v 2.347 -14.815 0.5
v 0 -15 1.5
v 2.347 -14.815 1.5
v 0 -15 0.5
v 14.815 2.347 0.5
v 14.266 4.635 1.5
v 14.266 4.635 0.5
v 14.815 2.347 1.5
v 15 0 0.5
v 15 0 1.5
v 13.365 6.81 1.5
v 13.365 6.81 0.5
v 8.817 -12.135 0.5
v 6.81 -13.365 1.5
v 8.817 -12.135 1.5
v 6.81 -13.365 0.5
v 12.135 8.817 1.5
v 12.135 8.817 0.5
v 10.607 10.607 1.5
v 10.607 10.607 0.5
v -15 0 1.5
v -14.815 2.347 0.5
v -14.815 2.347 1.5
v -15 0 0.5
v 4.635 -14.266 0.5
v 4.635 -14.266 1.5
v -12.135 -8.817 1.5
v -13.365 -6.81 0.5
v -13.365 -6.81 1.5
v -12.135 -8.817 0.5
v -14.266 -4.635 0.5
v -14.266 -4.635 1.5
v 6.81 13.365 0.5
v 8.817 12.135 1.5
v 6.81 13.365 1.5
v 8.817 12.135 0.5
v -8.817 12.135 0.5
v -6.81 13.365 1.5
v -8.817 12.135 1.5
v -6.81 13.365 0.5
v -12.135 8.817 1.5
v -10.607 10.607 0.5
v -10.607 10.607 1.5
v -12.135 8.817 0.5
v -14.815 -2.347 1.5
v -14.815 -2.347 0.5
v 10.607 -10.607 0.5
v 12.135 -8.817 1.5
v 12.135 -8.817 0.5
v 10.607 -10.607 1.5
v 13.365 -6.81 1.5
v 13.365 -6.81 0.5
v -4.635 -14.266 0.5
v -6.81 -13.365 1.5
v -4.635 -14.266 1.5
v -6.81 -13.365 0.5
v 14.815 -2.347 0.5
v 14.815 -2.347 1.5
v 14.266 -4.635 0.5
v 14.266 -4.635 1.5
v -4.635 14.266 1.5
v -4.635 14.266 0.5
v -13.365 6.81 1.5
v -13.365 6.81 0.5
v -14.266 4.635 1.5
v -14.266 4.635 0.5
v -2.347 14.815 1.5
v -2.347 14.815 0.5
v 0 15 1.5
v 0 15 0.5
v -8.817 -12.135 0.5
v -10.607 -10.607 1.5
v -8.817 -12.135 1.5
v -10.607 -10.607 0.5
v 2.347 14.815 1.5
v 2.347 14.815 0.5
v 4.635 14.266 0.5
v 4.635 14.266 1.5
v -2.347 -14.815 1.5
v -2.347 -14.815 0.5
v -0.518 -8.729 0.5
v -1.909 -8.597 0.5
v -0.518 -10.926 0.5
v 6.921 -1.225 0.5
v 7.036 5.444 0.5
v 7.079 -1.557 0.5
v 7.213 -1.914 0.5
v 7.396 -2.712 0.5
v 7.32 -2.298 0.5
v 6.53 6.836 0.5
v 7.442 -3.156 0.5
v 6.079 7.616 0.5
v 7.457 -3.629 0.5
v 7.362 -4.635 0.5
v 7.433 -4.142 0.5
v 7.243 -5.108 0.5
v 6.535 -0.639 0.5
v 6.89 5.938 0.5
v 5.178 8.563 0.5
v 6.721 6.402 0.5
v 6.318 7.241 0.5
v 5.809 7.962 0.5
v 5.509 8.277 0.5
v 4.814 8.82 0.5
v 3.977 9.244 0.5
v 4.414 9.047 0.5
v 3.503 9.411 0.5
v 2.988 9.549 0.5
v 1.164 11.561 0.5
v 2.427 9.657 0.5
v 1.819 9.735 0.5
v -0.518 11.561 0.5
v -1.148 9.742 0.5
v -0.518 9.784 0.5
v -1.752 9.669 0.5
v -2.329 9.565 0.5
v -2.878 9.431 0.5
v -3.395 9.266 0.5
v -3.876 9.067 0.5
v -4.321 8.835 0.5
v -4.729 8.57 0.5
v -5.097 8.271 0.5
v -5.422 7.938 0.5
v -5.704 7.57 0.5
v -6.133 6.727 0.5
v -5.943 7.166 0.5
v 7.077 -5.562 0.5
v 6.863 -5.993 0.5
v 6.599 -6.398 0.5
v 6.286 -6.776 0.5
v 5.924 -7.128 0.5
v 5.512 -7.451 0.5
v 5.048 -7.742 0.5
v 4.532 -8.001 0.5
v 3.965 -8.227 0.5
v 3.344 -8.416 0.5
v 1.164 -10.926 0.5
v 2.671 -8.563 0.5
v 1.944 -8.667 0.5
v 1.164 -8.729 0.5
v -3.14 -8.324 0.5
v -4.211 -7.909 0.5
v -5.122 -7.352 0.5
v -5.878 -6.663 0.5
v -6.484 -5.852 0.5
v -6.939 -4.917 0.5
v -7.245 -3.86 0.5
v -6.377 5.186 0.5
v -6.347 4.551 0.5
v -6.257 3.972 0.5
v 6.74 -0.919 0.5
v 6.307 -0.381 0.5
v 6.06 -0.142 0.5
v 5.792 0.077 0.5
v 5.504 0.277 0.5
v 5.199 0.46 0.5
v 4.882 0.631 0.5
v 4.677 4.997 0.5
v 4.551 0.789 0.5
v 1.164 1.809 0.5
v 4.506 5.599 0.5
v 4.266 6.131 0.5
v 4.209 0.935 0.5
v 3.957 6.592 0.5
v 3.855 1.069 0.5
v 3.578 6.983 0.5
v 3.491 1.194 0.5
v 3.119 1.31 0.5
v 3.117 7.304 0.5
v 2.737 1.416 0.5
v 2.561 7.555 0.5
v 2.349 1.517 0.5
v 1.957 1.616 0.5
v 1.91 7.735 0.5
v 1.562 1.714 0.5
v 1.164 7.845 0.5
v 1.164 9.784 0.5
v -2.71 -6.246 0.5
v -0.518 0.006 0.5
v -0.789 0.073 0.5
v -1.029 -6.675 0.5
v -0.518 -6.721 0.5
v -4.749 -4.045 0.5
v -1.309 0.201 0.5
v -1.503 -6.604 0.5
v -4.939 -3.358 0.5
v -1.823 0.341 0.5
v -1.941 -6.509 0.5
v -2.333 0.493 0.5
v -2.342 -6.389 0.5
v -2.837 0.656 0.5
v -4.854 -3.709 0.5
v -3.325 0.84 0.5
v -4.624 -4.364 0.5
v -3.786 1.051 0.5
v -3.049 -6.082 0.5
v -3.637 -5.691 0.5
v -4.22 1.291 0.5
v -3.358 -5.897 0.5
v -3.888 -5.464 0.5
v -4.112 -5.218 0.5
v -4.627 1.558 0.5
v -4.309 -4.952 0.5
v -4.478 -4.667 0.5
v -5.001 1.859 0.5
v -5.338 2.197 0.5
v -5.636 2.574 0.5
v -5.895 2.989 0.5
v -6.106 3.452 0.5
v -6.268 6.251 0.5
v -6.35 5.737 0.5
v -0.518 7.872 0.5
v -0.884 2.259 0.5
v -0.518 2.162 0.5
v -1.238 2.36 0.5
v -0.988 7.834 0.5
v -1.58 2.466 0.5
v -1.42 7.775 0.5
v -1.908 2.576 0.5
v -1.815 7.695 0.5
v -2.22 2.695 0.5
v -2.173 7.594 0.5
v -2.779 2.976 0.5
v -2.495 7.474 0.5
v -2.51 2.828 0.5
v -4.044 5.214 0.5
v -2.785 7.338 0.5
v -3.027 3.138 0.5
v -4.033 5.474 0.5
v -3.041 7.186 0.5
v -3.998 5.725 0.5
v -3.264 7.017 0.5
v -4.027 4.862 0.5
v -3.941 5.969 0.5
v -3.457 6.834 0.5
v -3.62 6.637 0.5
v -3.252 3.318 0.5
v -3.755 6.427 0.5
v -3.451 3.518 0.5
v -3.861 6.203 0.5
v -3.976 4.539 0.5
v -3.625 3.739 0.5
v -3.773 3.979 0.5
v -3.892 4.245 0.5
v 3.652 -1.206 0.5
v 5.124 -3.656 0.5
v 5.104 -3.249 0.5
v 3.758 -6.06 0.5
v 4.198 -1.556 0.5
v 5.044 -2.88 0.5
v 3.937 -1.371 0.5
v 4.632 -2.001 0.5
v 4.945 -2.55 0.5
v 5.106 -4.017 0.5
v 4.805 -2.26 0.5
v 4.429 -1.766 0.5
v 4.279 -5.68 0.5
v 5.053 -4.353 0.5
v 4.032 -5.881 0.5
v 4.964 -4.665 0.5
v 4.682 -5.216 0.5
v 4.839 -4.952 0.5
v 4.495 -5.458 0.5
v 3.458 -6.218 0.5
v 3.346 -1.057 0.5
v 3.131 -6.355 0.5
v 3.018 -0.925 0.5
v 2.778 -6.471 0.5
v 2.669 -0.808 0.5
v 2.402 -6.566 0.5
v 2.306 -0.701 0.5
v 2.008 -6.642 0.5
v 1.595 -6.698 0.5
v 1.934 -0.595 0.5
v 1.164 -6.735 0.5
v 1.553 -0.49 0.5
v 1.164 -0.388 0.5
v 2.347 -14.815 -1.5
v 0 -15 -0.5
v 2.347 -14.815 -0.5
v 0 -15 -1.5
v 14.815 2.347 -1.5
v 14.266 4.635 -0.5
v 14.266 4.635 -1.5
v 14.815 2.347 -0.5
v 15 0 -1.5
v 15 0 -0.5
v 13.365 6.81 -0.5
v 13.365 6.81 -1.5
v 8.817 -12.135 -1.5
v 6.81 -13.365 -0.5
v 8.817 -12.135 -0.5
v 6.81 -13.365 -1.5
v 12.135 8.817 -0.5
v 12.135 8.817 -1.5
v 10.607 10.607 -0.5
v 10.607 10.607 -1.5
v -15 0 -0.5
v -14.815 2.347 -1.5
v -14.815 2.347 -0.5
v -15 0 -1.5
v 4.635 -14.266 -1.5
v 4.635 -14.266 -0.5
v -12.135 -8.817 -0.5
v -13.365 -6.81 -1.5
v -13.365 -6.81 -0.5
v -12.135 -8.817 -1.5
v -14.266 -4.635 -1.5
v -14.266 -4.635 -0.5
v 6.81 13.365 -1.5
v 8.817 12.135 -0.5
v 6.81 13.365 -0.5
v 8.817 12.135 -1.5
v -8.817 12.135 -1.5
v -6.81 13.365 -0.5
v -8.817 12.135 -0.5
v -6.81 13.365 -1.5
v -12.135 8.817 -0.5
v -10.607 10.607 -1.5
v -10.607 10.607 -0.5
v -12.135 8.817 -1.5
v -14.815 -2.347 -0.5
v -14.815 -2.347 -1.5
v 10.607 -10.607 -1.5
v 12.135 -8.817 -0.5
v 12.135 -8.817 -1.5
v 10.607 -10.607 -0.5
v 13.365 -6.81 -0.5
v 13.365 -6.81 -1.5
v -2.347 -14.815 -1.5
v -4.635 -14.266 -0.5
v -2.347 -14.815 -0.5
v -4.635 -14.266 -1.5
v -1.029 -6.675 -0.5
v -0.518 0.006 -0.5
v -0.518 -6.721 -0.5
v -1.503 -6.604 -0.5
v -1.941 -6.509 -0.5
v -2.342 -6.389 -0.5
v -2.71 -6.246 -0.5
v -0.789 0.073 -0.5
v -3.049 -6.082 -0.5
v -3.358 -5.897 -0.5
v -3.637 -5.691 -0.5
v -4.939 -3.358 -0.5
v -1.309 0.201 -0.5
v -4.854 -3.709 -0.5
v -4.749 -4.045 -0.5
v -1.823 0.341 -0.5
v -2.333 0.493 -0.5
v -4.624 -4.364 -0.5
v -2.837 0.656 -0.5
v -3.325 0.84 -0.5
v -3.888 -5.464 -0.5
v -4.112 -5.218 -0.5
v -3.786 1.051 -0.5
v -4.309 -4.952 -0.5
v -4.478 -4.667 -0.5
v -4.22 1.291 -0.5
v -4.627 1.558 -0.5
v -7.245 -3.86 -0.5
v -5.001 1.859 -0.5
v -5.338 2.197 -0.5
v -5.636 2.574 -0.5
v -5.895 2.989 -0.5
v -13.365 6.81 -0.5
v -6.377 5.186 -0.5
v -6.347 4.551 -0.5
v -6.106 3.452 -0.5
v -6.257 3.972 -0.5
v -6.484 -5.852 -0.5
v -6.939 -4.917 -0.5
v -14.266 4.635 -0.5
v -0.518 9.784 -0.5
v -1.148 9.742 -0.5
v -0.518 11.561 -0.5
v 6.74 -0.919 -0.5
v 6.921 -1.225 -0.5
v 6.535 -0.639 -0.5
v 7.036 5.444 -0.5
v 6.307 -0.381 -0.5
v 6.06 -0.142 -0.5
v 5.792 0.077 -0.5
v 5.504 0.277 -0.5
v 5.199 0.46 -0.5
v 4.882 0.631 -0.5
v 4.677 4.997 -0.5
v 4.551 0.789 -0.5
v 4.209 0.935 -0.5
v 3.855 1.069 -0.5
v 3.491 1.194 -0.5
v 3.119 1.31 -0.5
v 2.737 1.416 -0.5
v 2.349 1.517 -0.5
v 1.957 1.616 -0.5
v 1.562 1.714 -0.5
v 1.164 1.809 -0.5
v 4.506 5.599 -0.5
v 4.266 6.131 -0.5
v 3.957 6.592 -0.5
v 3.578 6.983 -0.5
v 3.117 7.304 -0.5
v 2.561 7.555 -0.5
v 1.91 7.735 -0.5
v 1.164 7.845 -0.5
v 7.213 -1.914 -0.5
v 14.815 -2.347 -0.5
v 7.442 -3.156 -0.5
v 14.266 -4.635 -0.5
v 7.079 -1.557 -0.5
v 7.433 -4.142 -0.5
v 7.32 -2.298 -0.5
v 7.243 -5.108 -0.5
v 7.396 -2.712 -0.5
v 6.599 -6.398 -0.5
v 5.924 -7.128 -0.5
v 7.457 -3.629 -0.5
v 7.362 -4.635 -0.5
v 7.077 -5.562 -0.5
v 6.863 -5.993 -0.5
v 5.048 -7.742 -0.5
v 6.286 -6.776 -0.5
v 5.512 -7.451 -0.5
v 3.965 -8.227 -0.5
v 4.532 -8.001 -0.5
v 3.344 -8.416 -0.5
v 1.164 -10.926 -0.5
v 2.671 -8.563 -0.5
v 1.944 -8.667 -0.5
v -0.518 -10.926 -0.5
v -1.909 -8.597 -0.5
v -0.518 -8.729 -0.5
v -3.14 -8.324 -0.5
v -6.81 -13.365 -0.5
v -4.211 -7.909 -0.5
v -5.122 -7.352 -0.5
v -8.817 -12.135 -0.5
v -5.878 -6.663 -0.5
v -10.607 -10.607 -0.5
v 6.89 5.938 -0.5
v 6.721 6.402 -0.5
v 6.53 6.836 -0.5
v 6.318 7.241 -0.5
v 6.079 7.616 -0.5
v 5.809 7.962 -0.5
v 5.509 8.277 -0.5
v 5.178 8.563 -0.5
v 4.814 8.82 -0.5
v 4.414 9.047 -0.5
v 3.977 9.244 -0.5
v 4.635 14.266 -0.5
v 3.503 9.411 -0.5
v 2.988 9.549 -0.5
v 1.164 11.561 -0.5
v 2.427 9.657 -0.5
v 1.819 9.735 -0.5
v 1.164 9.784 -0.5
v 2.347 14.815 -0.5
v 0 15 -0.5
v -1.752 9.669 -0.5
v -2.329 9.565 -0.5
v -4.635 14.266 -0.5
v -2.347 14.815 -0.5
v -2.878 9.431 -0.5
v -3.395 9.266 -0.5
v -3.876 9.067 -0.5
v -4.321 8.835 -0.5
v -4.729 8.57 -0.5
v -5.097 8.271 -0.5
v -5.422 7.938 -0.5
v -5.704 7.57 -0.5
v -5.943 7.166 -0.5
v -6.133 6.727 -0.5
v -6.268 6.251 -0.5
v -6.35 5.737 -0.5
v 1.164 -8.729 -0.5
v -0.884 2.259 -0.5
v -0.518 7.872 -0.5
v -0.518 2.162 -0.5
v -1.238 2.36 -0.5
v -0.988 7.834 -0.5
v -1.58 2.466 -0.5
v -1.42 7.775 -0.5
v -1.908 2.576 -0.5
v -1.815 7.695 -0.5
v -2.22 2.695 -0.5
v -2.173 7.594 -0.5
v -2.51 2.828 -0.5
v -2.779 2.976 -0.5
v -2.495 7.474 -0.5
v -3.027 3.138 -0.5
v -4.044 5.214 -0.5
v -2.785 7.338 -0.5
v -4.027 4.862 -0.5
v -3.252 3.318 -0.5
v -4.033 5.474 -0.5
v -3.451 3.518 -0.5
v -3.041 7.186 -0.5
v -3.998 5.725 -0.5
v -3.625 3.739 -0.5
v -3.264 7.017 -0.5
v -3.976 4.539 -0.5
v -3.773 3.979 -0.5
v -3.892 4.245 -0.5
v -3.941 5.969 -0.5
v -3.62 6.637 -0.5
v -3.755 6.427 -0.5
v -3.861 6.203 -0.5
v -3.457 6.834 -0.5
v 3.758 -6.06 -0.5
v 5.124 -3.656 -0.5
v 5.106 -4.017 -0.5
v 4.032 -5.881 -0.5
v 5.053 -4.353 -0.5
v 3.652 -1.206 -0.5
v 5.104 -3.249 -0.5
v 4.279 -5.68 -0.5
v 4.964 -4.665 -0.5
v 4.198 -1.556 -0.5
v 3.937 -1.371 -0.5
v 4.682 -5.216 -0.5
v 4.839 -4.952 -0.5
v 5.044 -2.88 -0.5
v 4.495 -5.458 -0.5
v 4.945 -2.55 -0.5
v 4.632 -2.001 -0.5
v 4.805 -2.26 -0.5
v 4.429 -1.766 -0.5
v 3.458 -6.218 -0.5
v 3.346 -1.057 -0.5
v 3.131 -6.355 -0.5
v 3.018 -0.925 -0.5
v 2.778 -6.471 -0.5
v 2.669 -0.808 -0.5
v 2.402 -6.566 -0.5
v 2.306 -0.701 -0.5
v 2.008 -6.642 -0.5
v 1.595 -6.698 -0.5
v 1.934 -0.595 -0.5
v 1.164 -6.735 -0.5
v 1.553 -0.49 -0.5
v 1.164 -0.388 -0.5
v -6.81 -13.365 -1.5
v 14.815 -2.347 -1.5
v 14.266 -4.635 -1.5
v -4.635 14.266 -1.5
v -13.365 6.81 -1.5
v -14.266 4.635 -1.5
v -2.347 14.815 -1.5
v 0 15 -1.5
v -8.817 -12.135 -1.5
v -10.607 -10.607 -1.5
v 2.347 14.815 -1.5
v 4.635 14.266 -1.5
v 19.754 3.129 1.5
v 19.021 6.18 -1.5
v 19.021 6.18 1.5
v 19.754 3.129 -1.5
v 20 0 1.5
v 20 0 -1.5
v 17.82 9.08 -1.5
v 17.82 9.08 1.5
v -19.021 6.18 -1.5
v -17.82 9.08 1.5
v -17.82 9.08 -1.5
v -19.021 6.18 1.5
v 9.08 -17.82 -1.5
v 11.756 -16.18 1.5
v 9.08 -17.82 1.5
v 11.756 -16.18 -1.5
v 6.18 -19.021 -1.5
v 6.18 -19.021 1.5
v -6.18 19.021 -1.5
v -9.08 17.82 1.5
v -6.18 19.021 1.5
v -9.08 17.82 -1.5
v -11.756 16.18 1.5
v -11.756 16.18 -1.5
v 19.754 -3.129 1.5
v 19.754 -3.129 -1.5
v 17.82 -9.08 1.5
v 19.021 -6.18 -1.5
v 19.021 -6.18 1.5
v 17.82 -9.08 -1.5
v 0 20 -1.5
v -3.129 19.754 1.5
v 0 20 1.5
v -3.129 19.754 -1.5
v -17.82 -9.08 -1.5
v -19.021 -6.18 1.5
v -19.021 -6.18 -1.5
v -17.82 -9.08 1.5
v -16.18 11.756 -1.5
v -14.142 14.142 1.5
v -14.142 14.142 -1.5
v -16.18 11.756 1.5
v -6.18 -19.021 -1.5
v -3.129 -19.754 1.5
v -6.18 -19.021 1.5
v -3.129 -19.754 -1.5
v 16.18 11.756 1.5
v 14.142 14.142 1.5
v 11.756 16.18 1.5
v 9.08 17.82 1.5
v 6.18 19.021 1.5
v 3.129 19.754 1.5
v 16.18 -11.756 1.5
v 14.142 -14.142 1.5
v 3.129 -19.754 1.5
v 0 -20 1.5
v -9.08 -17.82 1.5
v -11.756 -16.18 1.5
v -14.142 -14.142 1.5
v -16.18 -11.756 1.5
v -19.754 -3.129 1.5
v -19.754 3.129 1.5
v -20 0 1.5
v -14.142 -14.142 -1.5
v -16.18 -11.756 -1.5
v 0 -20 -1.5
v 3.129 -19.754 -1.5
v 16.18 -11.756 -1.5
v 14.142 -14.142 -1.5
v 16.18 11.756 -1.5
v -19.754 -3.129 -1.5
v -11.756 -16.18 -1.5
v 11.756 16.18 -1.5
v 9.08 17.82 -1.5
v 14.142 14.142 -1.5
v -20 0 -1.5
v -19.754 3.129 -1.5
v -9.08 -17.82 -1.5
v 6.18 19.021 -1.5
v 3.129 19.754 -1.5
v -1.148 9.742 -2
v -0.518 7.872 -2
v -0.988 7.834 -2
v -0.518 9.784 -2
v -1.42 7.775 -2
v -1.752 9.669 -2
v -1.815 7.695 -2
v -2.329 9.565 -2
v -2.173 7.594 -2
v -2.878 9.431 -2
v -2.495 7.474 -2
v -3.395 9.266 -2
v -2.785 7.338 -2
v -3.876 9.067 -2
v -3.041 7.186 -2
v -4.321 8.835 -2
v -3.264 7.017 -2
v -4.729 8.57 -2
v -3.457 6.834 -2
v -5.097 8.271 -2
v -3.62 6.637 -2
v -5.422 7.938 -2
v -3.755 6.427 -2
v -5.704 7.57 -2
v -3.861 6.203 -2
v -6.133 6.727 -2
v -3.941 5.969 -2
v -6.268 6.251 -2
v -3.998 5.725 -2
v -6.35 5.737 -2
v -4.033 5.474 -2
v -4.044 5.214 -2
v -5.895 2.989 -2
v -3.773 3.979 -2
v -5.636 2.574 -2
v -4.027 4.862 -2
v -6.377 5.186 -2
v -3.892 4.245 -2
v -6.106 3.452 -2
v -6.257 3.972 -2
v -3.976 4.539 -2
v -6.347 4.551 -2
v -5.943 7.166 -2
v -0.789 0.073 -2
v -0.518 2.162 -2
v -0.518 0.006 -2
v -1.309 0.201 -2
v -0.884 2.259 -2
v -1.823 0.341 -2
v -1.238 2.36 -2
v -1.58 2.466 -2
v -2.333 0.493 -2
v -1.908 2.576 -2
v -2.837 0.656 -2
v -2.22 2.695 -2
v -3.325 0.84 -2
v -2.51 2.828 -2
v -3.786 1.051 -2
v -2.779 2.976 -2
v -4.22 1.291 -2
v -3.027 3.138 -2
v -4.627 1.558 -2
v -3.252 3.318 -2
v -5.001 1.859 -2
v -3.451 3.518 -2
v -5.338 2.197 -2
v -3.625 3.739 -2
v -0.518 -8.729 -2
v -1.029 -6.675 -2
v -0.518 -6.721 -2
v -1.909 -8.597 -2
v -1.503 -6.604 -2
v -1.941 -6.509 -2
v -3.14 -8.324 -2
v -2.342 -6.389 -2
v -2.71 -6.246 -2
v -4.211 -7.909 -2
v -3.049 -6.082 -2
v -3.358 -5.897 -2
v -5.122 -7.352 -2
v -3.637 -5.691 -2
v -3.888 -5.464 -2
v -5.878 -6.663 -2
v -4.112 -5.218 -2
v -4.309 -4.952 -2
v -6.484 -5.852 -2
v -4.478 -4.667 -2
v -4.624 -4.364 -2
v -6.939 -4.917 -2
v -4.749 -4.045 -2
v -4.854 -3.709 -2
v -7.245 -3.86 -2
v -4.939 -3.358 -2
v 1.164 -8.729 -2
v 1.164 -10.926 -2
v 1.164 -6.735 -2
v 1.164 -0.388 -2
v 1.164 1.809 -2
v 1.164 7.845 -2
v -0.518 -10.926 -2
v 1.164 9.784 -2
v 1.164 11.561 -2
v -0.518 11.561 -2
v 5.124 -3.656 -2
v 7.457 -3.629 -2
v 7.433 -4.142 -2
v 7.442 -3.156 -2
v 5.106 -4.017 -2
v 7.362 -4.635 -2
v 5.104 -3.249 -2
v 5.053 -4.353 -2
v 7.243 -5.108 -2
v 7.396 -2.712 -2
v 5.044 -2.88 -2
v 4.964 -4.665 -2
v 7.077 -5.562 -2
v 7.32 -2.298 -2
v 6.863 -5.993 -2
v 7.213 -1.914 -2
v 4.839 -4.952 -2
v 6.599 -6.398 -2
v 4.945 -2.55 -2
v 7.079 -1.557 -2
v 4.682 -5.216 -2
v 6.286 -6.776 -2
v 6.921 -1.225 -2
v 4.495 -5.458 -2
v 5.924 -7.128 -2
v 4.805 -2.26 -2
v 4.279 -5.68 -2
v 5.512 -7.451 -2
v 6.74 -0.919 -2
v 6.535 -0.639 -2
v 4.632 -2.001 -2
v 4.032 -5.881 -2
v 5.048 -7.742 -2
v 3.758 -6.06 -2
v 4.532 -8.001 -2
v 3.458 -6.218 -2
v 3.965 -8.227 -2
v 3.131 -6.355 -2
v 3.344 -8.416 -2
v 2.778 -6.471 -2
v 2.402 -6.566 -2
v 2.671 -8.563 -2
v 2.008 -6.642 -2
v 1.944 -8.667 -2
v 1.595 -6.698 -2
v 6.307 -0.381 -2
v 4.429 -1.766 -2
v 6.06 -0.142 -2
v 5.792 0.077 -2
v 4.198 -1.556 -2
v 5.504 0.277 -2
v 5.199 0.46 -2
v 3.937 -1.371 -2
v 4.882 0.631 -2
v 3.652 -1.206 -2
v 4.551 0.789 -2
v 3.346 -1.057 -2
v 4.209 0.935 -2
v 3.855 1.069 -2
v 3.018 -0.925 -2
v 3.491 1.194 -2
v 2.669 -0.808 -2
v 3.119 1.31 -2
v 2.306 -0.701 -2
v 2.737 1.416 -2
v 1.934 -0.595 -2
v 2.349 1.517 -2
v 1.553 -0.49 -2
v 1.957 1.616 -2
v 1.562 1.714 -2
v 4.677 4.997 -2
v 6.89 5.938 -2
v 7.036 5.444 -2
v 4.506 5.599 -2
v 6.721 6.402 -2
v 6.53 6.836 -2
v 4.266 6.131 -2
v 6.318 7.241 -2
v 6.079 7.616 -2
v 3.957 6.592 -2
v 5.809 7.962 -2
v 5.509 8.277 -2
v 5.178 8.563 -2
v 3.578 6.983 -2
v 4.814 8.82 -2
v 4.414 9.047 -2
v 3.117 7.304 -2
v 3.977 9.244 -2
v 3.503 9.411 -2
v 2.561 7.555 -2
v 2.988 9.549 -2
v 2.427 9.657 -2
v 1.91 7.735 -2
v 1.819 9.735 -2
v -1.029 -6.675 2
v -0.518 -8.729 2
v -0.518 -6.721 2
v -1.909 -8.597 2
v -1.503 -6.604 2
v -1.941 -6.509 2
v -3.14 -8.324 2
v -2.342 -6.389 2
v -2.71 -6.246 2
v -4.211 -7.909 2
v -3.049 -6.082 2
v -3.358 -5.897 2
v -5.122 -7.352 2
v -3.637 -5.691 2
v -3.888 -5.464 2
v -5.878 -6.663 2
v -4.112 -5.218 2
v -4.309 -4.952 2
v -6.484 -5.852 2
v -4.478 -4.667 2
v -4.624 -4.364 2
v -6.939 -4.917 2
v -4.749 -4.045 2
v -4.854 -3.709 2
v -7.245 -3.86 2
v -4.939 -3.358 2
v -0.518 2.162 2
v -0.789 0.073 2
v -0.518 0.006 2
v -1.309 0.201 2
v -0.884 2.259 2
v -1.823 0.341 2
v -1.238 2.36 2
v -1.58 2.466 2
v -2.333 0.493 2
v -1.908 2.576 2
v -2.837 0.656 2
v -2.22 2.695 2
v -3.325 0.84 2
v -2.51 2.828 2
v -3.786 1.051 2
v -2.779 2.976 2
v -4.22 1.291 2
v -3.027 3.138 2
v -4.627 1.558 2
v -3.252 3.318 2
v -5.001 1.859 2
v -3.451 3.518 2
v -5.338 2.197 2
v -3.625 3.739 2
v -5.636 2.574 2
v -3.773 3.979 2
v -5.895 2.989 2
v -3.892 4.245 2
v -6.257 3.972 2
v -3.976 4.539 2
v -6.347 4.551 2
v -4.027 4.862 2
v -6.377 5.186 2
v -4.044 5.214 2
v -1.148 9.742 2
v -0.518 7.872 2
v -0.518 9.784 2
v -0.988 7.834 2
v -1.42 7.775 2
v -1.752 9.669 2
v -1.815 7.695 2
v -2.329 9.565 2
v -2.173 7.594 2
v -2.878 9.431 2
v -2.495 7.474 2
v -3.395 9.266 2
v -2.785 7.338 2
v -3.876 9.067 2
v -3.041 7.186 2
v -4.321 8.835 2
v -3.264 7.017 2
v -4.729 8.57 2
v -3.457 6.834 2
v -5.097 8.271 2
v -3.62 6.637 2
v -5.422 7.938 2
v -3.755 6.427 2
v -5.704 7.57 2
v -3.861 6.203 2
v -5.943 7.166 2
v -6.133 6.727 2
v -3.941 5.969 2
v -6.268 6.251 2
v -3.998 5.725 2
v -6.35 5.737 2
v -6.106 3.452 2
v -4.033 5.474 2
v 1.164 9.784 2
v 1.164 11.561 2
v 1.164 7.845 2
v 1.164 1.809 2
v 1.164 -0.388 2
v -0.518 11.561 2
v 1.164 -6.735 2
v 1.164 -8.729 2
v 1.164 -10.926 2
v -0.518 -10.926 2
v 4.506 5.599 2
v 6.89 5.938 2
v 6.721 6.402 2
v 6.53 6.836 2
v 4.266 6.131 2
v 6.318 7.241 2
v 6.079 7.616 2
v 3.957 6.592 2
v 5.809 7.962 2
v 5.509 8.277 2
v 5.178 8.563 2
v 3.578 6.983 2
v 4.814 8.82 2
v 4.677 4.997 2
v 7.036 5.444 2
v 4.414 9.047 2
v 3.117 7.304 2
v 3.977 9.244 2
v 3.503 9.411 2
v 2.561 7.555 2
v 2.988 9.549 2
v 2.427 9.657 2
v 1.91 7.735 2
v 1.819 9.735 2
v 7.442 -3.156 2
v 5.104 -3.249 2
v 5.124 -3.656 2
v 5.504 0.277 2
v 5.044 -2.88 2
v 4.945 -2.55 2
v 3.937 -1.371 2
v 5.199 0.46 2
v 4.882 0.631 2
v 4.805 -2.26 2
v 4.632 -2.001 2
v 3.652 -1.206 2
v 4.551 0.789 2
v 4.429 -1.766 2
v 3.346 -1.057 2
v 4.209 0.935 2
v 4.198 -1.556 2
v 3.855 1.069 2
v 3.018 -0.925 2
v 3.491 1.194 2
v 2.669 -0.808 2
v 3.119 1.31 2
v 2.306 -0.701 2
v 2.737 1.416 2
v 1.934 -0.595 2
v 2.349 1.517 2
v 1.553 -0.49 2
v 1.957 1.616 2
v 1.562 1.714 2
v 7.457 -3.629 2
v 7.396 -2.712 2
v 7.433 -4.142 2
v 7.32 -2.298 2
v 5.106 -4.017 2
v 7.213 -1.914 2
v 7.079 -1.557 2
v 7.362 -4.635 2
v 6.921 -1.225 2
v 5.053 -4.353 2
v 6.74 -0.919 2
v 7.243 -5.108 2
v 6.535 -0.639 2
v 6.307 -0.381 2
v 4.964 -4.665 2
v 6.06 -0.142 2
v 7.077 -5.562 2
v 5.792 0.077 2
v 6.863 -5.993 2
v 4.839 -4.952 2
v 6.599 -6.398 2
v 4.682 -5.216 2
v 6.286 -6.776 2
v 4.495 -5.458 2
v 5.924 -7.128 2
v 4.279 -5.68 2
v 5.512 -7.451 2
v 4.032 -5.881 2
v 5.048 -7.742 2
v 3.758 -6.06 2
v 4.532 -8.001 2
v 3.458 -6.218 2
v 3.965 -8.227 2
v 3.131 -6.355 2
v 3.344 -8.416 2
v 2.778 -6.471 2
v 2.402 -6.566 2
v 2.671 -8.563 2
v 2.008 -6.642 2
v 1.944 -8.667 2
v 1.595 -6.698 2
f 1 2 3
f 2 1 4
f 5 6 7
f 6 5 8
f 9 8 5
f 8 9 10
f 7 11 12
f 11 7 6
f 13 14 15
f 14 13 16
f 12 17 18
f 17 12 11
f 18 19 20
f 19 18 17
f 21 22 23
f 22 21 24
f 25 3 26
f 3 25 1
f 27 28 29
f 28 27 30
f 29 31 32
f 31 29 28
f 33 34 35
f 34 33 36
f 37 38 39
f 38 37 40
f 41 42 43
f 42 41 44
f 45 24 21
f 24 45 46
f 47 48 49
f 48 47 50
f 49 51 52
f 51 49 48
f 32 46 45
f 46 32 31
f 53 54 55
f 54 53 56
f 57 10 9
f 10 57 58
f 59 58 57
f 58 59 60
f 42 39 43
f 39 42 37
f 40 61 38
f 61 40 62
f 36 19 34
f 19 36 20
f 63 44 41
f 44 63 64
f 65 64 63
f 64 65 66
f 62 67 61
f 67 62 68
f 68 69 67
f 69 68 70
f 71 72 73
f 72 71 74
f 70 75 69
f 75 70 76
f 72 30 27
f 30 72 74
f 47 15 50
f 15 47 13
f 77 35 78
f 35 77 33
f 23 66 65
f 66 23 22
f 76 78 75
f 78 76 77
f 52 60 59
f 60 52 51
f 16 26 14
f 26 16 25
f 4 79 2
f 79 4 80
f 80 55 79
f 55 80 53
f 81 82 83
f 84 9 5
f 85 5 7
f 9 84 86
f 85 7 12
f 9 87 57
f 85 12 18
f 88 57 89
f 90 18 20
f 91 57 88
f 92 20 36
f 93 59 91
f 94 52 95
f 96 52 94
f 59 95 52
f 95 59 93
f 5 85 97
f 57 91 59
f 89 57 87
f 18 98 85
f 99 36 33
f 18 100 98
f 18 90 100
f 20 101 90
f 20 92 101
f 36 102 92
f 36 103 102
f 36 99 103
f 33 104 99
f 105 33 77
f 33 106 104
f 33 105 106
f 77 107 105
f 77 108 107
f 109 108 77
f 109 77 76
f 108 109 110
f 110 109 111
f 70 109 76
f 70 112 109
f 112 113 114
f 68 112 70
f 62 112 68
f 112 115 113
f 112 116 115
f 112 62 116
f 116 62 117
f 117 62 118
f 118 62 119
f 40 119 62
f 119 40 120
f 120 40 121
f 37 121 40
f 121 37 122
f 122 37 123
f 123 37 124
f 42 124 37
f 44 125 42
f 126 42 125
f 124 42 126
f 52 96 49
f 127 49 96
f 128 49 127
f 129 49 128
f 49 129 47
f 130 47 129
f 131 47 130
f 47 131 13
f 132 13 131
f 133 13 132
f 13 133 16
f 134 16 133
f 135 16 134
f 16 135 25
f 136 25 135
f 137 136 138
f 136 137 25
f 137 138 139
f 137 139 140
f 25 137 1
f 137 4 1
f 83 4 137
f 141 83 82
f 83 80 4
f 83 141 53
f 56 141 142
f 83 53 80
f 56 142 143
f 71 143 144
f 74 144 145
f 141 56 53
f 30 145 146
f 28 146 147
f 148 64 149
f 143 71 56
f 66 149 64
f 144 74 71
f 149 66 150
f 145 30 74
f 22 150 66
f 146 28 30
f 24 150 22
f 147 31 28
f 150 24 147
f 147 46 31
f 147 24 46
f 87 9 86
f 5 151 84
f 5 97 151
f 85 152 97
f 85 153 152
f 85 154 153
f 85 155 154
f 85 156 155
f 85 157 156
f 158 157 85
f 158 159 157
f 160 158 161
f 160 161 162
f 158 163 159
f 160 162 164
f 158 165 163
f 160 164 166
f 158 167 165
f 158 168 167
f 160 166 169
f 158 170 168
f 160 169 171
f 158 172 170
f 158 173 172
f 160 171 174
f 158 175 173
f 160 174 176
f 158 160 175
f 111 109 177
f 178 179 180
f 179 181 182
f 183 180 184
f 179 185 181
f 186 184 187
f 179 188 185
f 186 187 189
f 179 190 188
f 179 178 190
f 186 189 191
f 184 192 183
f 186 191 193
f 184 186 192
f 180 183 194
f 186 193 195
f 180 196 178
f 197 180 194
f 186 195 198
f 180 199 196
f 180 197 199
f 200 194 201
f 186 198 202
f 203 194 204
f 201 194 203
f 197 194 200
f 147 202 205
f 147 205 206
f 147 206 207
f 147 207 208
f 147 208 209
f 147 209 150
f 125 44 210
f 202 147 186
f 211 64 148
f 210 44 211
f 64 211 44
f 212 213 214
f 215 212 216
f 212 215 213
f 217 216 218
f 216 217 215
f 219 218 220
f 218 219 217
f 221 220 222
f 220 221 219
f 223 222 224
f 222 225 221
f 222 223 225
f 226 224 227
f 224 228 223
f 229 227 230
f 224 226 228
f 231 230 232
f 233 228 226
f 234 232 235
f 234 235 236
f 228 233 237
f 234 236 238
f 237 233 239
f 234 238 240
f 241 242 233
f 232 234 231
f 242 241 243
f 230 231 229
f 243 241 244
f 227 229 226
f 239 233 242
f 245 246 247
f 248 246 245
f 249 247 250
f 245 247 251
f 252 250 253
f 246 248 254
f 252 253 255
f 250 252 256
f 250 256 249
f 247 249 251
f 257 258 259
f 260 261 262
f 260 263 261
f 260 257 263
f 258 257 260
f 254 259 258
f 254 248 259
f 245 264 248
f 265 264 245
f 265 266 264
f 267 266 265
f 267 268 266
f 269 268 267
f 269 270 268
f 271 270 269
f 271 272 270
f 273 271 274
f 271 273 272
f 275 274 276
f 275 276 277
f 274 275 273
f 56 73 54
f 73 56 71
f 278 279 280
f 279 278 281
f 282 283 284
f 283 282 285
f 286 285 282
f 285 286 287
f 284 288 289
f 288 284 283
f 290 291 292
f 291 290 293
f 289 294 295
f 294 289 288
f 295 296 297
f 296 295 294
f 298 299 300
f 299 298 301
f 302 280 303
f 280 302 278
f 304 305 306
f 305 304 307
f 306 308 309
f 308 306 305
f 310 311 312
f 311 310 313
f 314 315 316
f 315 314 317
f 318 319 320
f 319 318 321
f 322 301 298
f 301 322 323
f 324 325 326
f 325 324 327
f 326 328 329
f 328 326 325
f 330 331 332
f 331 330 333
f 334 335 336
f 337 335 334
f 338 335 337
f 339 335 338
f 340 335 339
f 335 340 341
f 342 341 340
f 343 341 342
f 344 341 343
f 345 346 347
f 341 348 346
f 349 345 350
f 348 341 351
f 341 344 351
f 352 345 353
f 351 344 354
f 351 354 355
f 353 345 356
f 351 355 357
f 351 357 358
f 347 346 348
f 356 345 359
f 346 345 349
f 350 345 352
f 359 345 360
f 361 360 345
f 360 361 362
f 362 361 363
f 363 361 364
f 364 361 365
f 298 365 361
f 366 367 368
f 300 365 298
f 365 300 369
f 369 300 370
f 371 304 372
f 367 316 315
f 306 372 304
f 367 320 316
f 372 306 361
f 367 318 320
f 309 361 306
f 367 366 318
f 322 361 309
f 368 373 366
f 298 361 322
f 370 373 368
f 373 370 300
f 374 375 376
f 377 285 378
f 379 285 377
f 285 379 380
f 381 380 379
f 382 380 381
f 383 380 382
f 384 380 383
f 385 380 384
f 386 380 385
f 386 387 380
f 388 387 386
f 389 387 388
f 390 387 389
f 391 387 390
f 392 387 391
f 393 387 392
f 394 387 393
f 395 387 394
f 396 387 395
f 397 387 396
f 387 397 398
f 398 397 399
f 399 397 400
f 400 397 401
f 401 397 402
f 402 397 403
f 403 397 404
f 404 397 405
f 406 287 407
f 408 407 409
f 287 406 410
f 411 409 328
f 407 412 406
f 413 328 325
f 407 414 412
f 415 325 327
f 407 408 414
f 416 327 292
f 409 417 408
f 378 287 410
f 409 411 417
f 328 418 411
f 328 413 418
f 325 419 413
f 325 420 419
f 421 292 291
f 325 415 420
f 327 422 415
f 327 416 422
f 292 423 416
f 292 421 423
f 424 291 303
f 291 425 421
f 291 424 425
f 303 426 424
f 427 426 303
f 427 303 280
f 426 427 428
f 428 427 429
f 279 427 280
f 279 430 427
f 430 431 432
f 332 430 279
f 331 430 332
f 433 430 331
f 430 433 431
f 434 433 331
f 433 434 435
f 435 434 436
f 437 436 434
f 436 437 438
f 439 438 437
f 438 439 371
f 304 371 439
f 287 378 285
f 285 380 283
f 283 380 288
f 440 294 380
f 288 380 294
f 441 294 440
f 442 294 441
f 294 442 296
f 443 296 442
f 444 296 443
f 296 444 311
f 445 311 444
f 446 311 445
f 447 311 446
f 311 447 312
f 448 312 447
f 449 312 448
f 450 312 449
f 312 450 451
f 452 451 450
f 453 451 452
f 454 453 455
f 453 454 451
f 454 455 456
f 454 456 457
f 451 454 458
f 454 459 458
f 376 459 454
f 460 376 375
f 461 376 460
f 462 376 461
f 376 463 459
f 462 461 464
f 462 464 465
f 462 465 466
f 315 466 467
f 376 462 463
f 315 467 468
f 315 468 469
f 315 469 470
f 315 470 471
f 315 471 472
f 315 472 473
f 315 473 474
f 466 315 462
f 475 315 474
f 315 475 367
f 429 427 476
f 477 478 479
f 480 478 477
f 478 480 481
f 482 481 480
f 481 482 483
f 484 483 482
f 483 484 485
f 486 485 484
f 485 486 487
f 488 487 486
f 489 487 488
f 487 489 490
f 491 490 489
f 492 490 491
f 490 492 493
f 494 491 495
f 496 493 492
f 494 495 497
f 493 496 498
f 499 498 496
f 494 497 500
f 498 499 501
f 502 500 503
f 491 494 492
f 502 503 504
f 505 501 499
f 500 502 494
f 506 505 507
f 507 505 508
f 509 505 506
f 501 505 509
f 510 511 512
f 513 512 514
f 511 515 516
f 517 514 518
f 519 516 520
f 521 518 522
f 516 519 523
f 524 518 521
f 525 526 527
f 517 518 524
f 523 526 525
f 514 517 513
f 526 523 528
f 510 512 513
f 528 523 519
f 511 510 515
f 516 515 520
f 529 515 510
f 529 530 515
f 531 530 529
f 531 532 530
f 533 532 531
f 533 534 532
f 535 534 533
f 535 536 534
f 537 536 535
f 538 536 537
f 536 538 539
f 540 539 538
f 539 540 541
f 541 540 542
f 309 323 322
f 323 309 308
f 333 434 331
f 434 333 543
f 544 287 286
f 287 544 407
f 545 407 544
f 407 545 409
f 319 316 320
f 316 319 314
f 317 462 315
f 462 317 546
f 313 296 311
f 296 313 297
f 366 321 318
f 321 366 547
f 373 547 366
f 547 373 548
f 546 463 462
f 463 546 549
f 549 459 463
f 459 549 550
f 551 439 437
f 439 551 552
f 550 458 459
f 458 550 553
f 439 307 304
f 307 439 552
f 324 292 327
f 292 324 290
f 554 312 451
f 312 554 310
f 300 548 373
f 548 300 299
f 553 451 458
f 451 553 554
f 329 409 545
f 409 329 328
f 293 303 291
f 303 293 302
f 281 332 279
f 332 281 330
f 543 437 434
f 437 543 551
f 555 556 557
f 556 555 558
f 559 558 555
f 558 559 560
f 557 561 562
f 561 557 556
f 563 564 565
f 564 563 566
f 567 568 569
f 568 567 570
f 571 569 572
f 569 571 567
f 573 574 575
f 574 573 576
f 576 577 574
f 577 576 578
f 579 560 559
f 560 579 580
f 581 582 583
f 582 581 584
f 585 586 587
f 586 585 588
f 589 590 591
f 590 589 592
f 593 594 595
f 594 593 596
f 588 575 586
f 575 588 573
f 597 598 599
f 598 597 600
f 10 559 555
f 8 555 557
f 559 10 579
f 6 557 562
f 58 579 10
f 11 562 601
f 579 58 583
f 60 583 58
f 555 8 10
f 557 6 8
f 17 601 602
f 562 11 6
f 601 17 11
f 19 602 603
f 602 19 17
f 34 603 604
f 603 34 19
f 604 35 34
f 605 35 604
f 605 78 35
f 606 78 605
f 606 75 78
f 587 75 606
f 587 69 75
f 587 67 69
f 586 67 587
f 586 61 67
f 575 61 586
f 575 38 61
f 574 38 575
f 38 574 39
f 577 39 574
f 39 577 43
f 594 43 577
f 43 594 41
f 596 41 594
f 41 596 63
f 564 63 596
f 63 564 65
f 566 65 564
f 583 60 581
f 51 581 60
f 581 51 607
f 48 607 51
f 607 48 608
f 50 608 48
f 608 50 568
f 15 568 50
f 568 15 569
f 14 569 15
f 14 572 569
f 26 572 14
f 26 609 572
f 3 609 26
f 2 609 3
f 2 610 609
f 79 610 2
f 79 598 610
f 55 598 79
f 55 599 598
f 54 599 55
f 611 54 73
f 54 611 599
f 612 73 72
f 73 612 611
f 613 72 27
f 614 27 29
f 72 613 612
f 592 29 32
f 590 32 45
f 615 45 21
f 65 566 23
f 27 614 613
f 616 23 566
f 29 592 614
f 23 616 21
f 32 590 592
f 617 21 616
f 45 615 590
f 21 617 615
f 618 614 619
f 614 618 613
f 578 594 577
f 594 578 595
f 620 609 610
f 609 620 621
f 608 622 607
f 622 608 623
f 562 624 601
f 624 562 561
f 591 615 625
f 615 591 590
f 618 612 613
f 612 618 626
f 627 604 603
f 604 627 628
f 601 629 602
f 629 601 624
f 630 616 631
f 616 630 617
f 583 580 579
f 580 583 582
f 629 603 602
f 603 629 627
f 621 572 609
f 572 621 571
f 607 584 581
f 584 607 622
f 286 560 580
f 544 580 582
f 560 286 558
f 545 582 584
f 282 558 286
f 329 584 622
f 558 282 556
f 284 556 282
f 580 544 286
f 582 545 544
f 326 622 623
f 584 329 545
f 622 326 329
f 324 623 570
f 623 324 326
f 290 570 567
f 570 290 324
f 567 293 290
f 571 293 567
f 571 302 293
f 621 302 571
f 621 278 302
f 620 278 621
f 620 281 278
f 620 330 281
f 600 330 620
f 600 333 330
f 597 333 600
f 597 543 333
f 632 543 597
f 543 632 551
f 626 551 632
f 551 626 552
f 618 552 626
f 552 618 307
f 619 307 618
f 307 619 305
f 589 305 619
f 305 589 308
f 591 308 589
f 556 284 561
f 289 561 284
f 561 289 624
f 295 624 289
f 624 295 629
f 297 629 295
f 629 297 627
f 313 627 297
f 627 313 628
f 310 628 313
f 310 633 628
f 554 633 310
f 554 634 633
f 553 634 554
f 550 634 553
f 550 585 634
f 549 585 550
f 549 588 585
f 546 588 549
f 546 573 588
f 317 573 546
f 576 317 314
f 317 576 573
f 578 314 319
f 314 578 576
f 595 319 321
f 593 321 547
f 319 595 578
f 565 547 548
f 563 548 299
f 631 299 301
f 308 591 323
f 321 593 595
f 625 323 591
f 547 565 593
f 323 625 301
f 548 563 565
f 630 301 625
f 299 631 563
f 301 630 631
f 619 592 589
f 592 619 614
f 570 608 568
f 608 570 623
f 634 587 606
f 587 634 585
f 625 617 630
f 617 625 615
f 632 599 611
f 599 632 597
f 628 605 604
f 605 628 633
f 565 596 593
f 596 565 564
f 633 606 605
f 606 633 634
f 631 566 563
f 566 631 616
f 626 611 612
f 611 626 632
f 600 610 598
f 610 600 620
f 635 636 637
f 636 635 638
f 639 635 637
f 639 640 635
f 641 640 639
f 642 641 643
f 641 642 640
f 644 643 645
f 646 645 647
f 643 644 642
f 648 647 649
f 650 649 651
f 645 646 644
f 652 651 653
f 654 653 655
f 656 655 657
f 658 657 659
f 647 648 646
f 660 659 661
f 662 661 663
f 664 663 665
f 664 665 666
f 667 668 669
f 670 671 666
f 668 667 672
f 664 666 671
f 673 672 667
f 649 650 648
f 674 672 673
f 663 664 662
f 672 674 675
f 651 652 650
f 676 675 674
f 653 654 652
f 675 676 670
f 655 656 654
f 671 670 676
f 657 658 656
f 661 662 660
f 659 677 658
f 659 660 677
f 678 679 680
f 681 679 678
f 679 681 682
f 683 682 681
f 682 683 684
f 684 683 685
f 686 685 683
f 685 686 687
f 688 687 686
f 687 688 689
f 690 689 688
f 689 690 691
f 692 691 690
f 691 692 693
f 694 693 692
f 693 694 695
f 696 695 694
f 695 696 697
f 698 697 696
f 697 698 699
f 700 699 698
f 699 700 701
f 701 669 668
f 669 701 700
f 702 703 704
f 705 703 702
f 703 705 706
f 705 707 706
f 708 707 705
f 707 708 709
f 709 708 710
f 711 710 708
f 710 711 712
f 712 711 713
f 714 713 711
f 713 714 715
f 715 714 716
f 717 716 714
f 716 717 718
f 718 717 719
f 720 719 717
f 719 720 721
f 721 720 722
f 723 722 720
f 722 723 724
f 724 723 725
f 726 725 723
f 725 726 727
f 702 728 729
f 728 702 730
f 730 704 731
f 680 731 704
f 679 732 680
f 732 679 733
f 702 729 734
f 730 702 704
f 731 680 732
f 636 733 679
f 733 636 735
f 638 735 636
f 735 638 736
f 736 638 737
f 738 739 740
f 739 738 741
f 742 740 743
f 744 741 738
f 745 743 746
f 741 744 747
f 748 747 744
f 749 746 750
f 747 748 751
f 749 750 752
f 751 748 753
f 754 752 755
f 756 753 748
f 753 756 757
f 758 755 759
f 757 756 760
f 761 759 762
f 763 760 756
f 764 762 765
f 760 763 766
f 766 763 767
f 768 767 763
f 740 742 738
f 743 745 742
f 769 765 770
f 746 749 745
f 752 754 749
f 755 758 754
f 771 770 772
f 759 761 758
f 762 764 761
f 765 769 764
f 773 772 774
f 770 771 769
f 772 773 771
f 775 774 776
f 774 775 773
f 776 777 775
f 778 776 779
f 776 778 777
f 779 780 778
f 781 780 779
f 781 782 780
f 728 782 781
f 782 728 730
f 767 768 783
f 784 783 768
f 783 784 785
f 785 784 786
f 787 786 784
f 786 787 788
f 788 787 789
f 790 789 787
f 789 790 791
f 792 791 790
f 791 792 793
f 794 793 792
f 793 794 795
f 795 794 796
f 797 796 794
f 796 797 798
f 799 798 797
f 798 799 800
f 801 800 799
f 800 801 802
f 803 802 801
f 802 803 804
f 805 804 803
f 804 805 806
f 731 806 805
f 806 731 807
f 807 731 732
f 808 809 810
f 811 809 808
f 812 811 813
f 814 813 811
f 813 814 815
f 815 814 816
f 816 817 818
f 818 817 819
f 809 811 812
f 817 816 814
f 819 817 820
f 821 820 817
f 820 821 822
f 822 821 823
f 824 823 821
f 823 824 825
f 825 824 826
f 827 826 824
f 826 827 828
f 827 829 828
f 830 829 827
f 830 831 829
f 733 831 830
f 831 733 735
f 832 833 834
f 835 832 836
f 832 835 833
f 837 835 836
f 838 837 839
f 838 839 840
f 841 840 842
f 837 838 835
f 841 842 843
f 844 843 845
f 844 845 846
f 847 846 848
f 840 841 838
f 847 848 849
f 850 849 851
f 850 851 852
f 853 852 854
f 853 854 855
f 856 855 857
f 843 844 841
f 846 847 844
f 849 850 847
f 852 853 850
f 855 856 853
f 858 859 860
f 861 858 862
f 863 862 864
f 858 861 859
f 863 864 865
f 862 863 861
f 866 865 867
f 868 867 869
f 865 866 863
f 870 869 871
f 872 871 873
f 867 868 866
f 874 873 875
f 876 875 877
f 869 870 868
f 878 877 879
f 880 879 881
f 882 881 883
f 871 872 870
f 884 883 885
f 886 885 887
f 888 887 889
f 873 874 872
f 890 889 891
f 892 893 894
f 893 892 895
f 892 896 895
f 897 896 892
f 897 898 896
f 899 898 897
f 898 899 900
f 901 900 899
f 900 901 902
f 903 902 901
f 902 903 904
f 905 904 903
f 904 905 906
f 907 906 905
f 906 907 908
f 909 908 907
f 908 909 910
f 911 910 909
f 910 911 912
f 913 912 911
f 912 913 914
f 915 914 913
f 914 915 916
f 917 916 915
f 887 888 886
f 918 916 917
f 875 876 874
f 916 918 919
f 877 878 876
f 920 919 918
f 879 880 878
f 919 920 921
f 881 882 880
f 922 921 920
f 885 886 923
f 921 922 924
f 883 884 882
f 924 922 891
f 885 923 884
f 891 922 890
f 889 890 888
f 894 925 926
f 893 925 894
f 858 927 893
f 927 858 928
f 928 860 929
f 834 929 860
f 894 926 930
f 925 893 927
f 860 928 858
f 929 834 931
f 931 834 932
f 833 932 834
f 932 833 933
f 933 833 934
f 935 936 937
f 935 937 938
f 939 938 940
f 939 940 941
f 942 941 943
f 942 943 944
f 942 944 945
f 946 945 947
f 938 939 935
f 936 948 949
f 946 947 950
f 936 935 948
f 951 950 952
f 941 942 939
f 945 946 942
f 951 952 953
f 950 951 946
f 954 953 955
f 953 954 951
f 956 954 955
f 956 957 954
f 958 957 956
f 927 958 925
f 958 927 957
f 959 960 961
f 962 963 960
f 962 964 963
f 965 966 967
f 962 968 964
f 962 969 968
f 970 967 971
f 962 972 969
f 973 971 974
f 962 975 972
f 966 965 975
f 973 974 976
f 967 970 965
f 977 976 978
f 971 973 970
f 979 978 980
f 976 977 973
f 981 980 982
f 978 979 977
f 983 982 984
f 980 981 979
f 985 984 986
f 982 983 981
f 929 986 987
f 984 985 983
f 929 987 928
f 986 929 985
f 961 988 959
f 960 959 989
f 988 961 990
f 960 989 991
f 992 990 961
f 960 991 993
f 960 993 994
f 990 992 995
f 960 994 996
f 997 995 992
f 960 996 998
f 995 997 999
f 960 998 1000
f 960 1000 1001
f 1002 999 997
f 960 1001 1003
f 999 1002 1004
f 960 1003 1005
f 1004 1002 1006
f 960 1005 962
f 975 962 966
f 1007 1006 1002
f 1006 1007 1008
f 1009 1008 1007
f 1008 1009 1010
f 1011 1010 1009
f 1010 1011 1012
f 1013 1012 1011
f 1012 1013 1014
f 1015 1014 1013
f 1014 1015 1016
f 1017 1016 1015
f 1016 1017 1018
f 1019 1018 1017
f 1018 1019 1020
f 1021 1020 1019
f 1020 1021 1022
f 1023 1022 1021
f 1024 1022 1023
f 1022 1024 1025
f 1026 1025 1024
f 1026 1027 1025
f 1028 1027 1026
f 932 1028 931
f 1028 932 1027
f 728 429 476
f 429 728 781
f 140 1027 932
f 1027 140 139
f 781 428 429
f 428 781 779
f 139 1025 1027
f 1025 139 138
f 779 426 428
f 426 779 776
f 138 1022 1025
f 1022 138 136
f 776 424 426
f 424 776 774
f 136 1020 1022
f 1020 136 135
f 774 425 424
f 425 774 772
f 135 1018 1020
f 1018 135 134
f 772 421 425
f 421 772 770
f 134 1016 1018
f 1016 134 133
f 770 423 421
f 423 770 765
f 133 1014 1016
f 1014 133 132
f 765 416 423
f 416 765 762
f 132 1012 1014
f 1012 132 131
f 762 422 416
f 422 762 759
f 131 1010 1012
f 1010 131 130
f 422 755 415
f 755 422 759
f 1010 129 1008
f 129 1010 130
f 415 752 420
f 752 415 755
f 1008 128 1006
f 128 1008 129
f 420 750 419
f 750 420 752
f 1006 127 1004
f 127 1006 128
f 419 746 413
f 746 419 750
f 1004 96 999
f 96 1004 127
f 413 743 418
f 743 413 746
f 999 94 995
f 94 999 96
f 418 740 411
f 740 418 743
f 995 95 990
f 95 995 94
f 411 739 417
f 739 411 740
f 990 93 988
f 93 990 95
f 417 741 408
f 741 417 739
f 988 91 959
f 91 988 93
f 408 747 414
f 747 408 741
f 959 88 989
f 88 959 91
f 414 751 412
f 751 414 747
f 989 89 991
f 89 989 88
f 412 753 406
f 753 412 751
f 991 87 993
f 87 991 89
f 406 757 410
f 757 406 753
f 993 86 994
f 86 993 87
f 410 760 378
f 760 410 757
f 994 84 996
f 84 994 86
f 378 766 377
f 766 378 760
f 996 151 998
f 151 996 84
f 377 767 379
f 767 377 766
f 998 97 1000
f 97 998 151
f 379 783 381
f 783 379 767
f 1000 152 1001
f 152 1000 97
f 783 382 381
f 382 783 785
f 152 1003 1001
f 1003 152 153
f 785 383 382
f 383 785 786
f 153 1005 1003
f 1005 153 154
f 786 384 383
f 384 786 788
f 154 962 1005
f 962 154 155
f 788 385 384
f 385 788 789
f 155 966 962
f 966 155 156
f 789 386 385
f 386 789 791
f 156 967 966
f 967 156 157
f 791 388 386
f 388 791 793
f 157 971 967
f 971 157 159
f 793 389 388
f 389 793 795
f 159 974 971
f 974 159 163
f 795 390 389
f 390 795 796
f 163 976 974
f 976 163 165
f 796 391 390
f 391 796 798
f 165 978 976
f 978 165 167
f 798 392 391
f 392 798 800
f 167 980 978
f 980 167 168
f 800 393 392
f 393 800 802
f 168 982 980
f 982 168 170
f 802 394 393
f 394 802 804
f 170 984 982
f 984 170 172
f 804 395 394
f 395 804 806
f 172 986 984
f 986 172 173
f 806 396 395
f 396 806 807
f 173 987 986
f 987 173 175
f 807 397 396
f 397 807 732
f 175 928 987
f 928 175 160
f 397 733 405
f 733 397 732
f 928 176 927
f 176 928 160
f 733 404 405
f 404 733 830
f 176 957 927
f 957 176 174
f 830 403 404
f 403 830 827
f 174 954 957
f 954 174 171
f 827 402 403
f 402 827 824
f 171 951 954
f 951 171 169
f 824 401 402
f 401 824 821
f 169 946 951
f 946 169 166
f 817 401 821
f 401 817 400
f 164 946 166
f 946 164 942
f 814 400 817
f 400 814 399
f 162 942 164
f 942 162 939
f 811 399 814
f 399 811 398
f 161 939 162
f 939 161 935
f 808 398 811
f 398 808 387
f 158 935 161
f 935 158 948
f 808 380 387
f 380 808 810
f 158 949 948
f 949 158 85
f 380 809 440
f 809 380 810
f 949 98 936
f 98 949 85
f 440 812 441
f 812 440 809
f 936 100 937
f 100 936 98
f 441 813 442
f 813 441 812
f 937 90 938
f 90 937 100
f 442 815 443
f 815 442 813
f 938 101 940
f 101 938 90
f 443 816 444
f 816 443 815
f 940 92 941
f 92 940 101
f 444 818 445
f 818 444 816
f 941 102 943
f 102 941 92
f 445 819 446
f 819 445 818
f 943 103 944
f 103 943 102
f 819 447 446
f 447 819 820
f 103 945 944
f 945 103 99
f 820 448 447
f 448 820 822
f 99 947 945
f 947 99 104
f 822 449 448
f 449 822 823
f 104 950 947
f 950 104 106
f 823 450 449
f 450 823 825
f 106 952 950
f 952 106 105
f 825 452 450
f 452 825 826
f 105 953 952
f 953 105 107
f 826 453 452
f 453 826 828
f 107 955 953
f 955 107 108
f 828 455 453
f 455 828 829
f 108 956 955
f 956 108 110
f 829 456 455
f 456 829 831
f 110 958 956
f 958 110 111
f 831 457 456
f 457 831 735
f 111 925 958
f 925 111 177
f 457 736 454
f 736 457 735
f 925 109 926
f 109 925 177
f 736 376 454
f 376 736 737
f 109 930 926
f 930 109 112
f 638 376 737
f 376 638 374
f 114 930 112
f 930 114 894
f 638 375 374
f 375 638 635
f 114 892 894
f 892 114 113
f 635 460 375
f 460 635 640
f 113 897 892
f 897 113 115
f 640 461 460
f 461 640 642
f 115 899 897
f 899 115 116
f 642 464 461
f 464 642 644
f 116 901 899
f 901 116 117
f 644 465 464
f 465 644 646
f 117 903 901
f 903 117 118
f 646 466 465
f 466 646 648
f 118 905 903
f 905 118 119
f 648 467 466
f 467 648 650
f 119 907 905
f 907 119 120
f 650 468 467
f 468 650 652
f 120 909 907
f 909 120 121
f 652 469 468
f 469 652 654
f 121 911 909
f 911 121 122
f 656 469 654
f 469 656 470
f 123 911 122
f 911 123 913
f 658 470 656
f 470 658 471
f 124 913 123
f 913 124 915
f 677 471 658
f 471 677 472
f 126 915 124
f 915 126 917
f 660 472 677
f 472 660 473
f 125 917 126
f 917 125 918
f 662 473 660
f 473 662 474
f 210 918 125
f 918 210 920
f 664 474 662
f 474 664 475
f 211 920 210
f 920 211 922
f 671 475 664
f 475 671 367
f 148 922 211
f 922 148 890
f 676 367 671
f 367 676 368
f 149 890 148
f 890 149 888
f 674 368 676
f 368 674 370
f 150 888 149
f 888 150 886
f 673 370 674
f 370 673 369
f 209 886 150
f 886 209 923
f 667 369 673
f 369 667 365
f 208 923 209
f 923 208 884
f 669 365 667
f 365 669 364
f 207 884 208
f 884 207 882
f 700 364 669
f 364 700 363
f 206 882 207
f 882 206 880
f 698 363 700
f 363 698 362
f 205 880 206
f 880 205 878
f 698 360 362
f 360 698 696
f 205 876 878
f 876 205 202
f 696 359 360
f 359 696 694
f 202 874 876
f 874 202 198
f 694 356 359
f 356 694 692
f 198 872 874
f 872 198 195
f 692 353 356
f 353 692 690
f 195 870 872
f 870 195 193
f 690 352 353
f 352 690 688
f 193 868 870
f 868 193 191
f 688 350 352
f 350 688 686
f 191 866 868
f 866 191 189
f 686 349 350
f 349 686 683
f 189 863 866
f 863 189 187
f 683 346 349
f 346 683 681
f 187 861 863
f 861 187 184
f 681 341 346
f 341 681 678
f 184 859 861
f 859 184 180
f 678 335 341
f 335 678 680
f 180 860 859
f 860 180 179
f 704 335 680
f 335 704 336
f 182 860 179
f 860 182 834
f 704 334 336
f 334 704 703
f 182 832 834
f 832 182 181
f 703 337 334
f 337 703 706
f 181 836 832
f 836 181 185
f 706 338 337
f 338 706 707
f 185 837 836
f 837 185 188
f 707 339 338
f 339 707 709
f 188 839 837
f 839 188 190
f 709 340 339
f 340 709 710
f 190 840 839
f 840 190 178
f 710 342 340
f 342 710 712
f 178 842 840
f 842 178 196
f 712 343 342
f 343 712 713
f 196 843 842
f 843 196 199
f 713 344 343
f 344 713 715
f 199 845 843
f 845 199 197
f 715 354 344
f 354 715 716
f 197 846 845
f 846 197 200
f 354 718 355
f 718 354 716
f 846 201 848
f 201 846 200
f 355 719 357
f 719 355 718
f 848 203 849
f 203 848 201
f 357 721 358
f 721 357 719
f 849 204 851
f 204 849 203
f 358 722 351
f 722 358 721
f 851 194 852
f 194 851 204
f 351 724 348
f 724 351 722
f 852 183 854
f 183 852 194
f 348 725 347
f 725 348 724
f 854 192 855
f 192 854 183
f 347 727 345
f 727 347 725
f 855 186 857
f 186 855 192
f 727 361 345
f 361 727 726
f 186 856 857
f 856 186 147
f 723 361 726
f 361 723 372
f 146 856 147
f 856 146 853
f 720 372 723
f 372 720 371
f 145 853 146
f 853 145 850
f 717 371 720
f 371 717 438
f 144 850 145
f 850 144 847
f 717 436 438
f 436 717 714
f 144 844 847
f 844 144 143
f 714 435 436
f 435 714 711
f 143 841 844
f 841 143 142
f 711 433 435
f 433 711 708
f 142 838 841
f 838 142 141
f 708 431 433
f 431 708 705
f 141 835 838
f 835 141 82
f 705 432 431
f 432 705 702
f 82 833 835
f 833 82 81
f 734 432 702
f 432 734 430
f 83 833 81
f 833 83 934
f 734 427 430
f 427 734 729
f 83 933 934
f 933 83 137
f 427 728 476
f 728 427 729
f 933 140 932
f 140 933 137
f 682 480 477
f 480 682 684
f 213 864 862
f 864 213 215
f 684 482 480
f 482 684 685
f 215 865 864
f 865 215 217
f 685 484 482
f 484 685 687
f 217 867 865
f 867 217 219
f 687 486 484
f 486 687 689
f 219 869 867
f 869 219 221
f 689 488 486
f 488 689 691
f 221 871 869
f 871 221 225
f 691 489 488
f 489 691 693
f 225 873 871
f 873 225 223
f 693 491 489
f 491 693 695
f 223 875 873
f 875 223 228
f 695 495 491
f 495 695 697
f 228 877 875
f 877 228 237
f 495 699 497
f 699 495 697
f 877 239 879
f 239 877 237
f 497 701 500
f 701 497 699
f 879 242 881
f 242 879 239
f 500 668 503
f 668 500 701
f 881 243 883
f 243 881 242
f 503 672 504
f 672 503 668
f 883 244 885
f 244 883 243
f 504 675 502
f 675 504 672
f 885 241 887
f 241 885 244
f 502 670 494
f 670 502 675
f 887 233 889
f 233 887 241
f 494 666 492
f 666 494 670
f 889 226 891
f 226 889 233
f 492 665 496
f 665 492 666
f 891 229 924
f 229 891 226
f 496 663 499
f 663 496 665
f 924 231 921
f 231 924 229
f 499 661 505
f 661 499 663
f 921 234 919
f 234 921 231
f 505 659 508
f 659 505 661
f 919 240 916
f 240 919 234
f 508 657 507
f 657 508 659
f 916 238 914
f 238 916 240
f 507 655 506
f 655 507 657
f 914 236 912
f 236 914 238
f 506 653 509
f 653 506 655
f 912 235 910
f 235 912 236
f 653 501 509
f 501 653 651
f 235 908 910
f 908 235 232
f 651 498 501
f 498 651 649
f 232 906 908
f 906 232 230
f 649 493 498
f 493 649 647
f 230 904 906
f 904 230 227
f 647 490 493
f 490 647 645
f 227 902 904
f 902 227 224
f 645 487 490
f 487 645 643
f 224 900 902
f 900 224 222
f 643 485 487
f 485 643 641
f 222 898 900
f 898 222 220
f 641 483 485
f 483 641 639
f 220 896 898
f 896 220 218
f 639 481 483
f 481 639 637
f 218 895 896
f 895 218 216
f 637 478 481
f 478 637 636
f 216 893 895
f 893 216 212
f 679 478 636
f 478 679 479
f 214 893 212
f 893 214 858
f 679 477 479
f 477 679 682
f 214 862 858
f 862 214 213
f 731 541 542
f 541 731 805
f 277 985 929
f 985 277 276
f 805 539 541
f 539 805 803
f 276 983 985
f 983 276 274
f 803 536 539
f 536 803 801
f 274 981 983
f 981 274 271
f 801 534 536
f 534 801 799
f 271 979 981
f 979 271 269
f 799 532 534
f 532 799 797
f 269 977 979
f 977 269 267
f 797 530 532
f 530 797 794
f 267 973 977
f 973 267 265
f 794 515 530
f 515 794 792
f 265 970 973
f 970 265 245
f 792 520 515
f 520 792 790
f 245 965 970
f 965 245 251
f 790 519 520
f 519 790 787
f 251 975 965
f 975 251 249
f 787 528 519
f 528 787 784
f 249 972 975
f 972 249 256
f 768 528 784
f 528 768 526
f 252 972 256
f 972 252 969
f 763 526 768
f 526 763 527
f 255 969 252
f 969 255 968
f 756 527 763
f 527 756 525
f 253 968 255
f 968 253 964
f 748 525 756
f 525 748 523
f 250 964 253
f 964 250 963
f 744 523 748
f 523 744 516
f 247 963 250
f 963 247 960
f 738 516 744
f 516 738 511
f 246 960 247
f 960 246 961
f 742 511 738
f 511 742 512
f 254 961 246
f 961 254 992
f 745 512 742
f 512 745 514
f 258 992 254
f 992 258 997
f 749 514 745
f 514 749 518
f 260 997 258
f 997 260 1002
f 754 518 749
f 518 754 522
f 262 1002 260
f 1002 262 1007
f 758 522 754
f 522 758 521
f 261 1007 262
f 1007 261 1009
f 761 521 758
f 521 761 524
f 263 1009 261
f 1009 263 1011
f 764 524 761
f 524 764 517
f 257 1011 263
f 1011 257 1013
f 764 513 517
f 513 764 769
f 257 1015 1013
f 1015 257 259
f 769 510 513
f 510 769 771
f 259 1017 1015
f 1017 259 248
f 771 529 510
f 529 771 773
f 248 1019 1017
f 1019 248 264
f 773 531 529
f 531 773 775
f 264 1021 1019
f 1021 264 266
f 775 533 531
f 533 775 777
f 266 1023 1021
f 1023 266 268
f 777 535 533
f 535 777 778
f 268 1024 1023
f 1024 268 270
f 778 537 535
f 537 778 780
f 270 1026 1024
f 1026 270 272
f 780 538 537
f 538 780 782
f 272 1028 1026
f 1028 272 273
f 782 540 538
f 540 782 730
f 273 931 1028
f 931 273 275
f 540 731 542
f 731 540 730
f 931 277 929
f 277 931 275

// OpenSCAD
module Coin_01(Mat = 0){

    //Color = [Main Body, Pocket] 
    bronze = ["#CD7F32","#7b4c1e"]; 
    silver = ["#c4aead","#cdc9c9"];
    gold = ["#ffd700","#daa520"];

    Material = [bronze,silver,gold];

    difference(){
            // Coin Main Body
            color(Material[Mat][0])
            cylinder(3,20,20, center= true, $fn = 40);
            
            // Make Pocket Hole
            color(Material[Mat][1]){   
            translate([0,0,2])
            cylinder(3,15,15, center= true, $fn = 40);
                 
            translate([0,0,-2])
            cylinder(3,15,15, center= true, $fn = 40);
            }

      
      
        }
      translate([0,-9,0]) 
      linear_extrude(height = 4, center =true ){
      text(text = "$", size = 20 ,center = true,halign ="center"); 
      }
}


Coin_01(Mat = 2);

// Written by Nicolì Angelo (Gengio) 2024: 
// MIT License

//Permission is hereby granted, free of charge, to any person obtaining a copy of this software and associated documentation files (the "Software"), to deal in the Software without restriction, including without limitation the rights to use, copy, modify, merge, publish, distribute, sublicense, and/or sell copies of the Software, and to permit persons to whom the Software is furnished to do so, subject to the following conditions:

//The above copyright notice and this permission notice shall be included in all copies or substantial portions of the Software.

//THE SOFTWARE IS PROVIDED "AS IS", WITHOUT WARRANTY OF ANY KIND, EXPRESS OR IMPLIED, INCLUDING BUT NOT LIMITED TO THE WARRANTIES OF MERCHANTABILITY, FITNESS FOR A PARTICULAR PURPOSE AND NONINFRINGEMENT. IN NO EVENT SHALL THE AUTHORS OR COPYRIGHT HOLDERS BE LIABLE FOR ANY CLAIM, DAMAGES OR OTHER LIABILITY, WHETHER IN AN ACTION OF CONTRACT, TORT OR OTHERWISE, ARISING FROM, OUT OF OR IN CONNECTION WITH THE SOFTWARE OR THE USE OR OTHER DEALINGS IN THE SOFTWARE.
